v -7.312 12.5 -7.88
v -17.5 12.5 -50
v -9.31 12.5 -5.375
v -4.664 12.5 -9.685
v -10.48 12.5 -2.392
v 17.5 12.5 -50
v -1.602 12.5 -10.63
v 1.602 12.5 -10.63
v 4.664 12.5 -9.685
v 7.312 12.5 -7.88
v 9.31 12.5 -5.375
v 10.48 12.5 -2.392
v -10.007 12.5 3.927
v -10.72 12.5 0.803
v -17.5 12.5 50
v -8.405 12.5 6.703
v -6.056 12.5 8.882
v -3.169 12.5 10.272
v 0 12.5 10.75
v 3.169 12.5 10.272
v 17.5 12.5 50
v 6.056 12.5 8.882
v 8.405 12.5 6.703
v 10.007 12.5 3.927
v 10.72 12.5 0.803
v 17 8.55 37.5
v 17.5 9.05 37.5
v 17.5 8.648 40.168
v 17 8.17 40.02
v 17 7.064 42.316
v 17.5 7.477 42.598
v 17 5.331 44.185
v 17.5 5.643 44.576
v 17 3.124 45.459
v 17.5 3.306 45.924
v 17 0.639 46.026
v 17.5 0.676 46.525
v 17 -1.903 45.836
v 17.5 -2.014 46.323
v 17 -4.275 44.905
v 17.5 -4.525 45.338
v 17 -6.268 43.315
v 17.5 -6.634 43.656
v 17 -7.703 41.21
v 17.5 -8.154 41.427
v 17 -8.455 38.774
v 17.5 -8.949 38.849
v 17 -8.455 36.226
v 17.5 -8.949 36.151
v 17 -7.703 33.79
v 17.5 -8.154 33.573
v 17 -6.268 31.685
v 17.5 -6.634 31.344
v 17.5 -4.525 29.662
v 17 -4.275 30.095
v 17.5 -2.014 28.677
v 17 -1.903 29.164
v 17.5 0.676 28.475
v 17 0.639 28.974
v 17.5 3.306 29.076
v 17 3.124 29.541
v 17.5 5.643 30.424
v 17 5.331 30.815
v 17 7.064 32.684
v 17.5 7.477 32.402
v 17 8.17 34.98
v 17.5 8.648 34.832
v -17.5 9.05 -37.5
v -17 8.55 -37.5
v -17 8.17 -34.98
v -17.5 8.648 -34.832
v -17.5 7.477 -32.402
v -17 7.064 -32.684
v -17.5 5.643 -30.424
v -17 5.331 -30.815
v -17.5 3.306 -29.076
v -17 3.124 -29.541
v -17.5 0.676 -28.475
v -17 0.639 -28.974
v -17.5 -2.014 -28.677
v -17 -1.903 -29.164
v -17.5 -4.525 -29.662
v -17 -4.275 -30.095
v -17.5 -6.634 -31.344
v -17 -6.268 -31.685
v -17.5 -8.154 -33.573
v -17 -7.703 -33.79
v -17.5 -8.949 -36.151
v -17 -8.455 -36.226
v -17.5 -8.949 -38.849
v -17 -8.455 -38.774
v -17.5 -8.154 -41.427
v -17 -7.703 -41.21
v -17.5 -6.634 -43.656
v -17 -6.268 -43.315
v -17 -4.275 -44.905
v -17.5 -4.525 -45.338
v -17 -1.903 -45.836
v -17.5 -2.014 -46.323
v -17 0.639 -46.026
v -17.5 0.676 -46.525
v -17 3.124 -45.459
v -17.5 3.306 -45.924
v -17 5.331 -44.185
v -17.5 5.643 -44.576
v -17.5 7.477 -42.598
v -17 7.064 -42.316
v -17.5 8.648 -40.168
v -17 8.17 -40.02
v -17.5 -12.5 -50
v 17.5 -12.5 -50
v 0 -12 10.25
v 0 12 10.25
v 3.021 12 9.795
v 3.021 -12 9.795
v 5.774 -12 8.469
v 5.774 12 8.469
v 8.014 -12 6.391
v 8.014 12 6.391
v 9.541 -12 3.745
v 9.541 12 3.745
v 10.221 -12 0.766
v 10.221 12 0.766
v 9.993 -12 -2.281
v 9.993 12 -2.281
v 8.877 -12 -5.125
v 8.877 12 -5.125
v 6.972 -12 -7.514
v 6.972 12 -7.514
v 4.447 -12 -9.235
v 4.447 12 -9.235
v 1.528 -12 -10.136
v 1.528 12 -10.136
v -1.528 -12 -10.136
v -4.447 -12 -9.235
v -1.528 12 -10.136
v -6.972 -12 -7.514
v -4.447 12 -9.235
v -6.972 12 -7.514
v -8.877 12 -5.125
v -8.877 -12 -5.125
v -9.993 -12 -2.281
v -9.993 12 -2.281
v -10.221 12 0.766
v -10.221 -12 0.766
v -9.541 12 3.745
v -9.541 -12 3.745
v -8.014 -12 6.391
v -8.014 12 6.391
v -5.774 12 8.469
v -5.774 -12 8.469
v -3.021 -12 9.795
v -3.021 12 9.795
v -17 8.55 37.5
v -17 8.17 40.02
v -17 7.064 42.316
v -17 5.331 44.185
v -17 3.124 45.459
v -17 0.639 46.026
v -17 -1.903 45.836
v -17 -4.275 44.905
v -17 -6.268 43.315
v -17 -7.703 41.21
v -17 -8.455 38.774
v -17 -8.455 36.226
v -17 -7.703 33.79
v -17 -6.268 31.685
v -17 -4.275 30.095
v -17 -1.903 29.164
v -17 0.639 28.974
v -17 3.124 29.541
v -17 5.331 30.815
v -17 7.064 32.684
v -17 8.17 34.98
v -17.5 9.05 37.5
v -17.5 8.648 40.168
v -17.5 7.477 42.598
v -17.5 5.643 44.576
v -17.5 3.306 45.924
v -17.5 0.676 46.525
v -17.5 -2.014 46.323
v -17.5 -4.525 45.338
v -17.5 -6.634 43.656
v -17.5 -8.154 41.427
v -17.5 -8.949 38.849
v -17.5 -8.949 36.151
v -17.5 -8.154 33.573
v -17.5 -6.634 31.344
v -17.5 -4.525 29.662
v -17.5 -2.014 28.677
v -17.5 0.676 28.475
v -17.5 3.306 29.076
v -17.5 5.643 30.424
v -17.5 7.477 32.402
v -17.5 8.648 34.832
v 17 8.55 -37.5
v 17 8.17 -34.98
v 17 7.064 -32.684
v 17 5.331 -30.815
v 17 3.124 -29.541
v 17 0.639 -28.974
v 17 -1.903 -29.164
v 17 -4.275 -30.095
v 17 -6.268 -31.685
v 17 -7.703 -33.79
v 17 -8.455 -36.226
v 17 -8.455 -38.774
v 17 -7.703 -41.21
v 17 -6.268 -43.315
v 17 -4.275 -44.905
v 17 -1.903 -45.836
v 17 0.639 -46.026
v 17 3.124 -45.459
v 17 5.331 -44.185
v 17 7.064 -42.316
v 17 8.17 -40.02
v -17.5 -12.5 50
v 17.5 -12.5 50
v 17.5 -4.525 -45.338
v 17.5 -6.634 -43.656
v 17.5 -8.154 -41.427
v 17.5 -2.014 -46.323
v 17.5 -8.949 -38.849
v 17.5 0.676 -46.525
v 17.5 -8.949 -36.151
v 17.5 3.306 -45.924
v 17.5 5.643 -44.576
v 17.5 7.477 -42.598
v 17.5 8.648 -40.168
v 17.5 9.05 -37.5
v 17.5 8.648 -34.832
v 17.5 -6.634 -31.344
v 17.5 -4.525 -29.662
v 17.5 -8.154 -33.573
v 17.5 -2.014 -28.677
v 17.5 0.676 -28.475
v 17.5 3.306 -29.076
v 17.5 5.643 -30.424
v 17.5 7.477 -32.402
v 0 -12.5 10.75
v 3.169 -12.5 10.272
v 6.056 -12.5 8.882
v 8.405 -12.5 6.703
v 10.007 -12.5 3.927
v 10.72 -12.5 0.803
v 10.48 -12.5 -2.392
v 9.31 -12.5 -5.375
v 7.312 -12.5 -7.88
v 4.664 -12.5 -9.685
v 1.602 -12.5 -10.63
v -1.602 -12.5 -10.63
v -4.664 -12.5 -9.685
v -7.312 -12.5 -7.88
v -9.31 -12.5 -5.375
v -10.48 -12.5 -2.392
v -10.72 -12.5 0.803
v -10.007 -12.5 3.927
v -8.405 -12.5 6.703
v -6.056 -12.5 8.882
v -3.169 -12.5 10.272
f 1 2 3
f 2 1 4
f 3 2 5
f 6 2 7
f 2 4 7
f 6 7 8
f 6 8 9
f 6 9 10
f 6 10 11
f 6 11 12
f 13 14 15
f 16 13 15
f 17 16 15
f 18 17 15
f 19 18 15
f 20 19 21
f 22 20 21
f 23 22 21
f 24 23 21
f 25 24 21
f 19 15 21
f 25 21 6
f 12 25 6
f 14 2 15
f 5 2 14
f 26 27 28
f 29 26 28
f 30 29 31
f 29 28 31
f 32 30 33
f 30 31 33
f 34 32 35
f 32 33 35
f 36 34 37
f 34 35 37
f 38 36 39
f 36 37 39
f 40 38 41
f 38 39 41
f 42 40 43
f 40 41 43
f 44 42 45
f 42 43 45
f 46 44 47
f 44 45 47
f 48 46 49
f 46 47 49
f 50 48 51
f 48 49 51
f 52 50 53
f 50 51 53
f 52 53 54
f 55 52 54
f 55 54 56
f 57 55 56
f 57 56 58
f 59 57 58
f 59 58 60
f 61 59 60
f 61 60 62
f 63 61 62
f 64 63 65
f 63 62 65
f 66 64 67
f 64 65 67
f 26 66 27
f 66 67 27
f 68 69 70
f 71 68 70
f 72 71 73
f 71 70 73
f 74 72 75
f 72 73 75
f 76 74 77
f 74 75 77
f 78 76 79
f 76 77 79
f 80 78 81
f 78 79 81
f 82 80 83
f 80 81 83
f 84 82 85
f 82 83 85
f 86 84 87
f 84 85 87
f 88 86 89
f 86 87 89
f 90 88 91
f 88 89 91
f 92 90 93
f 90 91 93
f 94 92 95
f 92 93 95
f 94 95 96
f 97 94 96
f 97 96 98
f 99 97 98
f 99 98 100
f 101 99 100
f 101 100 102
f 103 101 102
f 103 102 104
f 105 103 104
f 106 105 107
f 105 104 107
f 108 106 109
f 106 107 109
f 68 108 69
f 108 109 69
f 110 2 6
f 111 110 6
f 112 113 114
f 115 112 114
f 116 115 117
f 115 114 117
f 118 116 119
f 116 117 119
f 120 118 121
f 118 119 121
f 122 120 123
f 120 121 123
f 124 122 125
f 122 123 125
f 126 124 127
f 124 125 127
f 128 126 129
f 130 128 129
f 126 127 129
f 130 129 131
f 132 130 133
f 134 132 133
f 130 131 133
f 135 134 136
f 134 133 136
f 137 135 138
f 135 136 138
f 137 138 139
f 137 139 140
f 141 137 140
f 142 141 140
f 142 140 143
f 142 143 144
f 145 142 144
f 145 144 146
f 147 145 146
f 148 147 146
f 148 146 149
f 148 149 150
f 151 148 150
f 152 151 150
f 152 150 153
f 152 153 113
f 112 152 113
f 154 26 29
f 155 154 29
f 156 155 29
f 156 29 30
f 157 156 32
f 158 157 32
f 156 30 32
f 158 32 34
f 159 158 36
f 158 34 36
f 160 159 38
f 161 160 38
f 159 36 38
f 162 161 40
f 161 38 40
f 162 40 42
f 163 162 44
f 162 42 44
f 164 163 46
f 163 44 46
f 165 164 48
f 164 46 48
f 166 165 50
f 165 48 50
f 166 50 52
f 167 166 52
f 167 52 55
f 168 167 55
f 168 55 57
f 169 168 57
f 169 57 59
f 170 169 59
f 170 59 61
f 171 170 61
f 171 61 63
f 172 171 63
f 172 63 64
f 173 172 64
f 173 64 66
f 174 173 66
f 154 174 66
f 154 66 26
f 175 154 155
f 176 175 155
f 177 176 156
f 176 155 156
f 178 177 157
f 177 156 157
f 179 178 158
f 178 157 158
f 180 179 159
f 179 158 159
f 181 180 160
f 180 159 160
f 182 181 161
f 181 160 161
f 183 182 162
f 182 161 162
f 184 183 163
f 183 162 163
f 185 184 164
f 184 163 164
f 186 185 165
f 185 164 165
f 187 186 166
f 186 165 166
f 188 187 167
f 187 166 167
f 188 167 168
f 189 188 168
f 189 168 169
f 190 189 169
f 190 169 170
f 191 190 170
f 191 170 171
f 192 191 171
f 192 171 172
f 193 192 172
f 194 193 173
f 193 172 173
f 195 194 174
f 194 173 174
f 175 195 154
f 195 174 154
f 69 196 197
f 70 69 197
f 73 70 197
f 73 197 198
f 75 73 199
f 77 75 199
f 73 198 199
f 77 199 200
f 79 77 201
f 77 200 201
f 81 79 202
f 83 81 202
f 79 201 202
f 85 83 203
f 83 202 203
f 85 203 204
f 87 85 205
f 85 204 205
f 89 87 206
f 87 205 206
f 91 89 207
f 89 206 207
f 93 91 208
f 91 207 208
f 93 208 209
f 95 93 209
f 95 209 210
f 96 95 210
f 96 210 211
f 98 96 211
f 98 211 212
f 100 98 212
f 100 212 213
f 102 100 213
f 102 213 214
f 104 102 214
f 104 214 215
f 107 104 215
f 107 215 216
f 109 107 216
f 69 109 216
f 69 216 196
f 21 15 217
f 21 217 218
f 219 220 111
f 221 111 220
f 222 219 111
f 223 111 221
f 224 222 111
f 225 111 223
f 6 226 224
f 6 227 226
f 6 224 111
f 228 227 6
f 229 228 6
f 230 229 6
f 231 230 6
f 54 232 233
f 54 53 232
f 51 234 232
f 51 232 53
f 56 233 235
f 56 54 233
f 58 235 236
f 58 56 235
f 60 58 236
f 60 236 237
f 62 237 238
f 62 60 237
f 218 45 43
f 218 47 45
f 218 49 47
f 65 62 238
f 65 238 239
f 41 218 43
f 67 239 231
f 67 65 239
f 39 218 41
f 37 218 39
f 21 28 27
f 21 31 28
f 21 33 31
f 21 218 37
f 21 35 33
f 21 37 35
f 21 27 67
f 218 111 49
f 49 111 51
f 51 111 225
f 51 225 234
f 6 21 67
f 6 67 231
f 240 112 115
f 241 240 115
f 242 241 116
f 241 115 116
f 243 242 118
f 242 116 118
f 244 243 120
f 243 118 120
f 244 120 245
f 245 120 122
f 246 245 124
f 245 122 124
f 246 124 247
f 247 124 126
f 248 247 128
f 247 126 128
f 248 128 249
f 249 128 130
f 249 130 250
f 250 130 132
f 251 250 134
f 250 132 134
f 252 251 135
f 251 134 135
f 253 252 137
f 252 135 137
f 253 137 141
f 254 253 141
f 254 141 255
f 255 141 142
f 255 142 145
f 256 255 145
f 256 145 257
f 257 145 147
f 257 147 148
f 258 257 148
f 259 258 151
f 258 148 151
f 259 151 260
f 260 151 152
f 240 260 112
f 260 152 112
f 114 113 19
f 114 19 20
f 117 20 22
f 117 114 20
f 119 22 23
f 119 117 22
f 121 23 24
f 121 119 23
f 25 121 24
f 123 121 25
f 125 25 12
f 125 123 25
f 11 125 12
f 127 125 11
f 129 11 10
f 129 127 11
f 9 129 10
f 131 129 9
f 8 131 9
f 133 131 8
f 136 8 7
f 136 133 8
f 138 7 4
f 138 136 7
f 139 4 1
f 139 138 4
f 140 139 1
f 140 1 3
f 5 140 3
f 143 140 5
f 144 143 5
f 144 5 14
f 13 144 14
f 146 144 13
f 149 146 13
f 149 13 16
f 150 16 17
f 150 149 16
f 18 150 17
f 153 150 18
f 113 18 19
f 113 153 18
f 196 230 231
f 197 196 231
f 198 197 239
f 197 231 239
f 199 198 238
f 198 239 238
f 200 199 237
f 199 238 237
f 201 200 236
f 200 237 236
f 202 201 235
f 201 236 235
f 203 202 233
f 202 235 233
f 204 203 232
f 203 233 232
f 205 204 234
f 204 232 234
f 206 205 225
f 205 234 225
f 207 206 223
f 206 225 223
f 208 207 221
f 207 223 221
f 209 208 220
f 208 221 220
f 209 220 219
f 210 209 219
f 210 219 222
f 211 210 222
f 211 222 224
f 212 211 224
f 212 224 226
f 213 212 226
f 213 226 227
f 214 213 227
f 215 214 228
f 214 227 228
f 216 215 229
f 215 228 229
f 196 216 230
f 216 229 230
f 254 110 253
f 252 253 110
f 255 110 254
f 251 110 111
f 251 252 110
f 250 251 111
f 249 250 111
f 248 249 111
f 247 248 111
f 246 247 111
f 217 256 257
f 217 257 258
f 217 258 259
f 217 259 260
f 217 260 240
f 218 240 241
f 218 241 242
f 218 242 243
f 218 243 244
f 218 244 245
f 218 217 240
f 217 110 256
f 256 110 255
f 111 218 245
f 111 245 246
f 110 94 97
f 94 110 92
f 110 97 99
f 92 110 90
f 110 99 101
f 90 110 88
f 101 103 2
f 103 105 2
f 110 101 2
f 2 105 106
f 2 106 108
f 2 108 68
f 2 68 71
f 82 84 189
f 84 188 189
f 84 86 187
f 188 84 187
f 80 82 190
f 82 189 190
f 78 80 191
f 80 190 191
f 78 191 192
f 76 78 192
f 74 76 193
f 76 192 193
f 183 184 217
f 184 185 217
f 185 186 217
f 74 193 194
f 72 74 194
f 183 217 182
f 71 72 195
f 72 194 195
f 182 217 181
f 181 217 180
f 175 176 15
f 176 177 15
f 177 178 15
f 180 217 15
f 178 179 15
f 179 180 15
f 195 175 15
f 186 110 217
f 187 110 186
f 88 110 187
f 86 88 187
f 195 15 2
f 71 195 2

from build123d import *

# Parameters (mm, degrees)
SCHIZZO1_W                   = 35
SCHIZZO1_H                   = 25
ESTRUSIONE_ESTRUSIONE1_DEPTH = 50
SCHIZZO2_R                   = 10.25
TAGLIO_ESTRUSIONE1_DEPTH     = 100
SCHIZZO3_R                   = 8.55
TAGLIO_ESTRUSIONE3_DEPTH     = 63.299678972
SMUSSO1_SIZE                 = 0.5


with BuildPart() as part:
    # Schizzo1 → Estrusione-Estrusione1 (new, symmetric)
    with BuildSketch(Plane.XY):
        Rectangle(SCHIZZO1_W, SCHIZZO1_H)
    extrude(amount=ESTRUSIONE_ESTRUSIONE1_DEPTH, both=True)

    # Schizzo2 → Taglio-Estrusione1 (cut)
    with BuildSketch(Plane(origin=(0, 12.5, 0), x_dir=(1, 0, 0), z_dir=(0, 1, 0))):
        with Locations(Location((0, 0, 0), (0, 0, 270))):
            Circle(SCHIZZO2_R)
    extrude(amount=-TAGLIO_ESTRUSIONE1_DEPTH, mode=Mode.SUBTRACT)

    # Schizzo3 → Taglio-Estrusione3 (cut, through all)
    with BuildSketch(Plane(origin=(17.5, 0, 0), x_dir=(0, 0, -1), z_dir=(1, 0, 0))):
        with Locations(Location((37.5, 0, 0), (0, 0, 90))):
            Circle(SCHIZZO3_R)
        with Locations(Location((-37.5, 0, 0), (0, 0, 90))):
            Circle(SCHIZZO3_R)
    extrude(amount=-TAGLIO_ESTRUSIONE3_DEPTH, mode=Mode.SUBTRACT)

    # Smusso1
    smusso1_edges = [part.edges().sort_by_distance(p)[0] for p in [
        (0, -12.5, -10.25),
        (0, 12.5, -10.25),
        (-17.5, -8.55, -37.5),
        (17.5, -8.55, -37.5),
        (-17.5, -8.55, 37.5),
        (17.5, -8.55, 37.5),
    ]]
    chamfer(smusso1_edges, length=SMUSSO1_SIZE)


solid = part.part
